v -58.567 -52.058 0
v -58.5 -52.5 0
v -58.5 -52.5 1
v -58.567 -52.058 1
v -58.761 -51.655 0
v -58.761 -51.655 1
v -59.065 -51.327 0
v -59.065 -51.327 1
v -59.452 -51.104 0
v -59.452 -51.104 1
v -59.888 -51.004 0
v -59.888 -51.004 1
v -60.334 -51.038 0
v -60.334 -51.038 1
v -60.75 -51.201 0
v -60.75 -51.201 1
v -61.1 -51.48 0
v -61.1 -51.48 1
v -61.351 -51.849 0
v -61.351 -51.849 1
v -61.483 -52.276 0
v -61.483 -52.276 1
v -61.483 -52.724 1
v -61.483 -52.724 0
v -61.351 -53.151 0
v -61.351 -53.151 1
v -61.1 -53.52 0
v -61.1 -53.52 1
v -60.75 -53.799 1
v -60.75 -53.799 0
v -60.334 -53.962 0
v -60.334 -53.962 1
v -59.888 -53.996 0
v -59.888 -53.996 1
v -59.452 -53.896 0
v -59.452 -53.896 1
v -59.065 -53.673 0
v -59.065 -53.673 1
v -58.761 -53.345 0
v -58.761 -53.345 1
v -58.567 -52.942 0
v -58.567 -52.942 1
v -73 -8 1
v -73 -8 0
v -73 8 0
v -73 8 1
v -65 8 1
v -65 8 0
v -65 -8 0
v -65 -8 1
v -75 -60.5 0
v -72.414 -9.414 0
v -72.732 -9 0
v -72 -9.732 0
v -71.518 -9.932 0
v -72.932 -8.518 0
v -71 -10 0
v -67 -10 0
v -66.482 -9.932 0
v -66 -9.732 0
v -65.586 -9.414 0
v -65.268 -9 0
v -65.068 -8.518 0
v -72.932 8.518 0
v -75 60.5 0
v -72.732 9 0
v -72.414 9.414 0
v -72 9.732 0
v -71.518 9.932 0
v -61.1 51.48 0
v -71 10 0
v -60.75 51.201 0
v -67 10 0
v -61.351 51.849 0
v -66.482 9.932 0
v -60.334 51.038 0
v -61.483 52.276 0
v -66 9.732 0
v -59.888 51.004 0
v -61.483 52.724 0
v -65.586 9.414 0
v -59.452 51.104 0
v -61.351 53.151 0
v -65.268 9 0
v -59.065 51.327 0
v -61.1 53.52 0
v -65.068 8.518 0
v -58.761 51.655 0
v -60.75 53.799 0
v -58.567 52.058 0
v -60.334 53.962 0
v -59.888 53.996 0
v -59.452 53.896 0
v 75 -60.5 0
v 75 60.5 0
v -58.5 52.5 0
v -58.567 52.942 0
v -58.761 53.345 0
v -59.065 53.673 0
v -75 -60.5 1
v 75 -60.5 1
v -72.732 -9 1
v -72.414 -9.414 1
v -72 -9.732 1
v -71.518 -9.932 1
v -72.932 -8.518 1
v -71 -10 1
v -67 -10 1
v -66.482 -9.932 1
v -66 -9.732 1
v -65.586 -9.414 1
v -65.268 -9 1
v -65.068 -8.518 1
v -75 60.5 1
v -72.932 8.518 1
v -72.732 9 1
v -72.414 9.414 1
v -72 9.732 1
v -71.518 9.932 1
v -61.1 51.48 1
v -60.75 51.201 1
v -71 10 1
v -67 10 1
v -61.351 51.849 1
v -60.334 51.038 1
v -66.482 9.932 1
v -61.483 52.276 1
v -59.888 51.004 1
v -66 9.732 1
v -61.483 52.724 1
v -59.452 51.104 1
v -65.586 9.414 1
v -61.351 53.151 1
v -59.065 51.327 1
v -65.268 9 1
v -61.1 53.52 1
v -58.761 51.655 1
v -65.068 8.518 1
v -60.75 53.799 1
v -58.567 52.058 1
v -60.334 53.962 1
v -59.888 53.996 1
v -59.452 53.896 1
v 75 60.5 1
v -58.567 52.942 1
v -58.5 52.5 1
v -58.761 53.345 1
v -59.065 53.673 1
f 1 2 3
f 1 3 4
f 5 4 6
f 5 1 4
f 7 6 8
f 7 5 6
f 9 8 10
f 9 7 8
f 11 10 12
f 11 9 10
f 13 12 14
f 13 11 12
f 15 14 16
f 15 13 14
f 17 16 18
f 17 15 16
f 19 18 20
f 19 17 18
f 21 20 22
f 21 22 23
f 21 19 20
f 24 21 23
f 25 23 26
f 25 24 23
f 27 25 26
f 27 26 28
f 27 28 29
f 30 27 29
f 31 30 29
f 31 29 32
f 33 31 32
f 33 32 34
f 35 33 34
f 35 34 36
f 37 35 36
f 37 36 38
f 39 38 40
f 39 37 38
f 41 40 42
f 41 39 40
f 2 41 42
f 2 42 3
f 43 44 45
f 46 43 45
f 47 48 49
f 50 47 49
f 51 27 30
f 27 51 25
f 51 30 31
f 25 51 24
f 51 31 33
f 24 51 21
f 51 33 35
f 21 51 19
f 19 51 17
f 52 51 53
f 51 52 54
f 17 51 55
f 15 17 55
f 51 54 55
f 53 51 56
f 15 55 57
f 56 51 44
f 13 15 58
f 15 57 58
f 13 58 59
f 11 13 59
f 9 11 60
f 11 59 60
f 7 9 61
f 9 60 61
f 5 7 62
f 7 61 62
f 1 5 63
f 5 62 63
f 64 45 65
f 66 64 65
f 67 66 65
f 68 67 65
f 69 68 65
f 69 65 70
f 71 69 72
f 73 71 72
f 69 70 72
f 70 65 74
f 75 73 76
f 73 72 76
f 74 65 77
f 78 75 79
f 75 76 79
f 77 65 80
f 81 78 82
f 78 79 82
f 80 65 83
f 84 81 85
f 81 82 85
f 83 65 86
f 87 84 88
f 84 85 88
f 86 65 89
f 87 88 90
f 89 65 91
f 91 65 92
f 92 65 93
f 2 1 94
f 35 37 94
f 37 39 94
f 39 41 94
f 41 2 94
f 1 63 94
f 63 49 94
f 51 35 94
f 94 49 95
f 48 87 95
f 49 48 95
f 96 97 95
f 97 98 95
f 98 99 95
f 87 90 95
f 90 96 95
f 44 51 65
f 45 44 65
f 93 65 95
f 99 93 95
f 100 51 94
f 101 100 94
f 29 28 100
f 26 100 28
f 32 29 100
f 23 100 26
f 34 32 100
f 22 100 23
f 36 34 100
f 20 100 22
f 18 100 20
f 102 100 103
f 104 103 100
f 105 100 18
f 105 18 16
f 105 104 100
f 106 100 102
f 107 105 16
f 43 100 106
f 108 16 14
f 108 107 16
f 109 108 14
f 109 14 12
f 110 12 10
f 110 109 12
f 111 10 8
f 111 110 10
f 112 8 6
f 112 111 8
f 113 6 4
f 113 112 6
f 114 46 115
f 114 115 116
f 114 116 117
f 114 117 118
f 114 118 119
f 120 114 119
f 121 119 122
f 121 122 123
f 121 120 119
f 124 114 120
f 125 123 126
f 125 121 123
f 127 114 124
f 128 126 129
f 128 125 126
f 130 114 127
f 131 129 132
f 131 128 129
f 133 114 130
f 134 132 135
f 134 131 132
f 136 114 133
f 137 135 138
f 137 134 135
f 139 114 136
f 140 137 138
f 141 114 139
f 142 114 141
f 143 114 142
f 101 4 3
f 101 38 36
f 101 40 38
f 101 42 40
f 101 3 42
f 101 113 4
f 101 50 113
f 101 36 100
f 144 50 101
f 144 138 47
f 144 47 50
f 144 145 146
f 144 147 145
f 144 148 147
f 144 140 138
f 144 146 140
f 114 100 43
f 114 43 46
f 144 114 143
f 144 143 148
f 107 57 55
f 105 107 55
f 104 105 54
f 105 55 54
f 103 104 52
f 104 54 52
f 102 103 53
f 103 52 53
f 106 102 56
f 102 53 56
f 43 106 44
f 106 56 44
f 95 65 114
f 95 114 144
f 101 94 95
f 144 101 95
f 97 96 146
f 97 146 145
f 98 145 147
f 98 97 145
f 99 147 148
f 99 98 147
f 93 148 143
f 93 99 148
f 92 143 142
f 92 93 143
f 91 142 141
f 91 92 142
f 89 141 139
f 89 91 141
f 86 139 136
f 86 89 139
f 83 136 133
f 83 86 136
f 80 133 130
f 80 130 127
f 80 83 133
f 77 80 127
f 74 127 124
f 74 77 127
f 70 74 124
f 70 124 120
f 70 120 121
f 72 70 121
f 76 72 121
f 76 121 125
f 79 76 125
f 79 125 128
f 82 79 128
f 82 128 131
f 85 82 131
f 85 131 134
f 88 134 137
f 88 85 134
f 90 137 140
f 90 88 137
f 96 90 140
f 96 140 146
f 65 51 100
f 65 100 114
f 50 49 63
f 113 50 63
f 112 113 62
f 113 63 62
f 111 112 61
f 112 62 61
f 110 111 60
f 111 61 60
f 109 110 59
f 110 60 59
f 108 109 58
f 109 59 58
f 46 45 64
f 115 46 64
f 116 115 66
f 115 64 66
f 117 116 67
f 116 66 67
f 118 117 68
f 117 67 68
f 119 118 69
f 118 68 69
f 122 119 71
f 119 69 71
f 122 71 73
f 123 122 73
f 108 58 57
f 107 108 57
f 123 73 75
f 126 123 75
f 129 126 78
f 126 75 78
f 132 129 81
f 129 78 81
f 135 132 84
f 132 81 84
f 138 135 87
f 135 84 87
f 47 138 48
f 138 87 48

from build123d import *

# Parameters (mm, degrees)
SKETCH_1_W      = 150
SKETCH_1_H      = 121
SKETCH_1_R      = 1.5
EXTRUDE_2_DEPTH = 1


with BuildPart() as part:
    # 草图1 → 凸台-拉伸2 (new body)
    with BuildSketch(Plane.XY):
        Rectangle(SKETCH_1_W, SKETCH_1_H)
        with Locations((-60, 52.5)):
            Circle(SKETCH_1_R, mode=Mode.SUBTRACT)
        with Locations((-60, -52.5)):
            Circle(SKETCH_1_R, mode=Mode.SUBTRACT)
        with BuildLine():
            Line((-71, 10), (-67, 10))
            ThreePointArc((-67, 10), (-65.585786438, 9.414213562), (-65, 8))
            Line((-65, 8), (-65, -8))
            ThreePointArc((-65, -8), (-65.585786438, -9.414213562), (-67, -10))
            Line((-67, -10), (-71, -10))
            ThreePointArc((-71, -10), (-72.414213562, -9.414213562), (-73, -8))
            Line((-73, -8), (-73, 8))
            ThreePointArc((-73, 8), (-72.414213562, 9.414213562), (-71, 10))
        make_face(mode=Mode.SUBTRACT)
    extrude(amount=EXTRUDE_2_DEPTH)


solid = part.part
